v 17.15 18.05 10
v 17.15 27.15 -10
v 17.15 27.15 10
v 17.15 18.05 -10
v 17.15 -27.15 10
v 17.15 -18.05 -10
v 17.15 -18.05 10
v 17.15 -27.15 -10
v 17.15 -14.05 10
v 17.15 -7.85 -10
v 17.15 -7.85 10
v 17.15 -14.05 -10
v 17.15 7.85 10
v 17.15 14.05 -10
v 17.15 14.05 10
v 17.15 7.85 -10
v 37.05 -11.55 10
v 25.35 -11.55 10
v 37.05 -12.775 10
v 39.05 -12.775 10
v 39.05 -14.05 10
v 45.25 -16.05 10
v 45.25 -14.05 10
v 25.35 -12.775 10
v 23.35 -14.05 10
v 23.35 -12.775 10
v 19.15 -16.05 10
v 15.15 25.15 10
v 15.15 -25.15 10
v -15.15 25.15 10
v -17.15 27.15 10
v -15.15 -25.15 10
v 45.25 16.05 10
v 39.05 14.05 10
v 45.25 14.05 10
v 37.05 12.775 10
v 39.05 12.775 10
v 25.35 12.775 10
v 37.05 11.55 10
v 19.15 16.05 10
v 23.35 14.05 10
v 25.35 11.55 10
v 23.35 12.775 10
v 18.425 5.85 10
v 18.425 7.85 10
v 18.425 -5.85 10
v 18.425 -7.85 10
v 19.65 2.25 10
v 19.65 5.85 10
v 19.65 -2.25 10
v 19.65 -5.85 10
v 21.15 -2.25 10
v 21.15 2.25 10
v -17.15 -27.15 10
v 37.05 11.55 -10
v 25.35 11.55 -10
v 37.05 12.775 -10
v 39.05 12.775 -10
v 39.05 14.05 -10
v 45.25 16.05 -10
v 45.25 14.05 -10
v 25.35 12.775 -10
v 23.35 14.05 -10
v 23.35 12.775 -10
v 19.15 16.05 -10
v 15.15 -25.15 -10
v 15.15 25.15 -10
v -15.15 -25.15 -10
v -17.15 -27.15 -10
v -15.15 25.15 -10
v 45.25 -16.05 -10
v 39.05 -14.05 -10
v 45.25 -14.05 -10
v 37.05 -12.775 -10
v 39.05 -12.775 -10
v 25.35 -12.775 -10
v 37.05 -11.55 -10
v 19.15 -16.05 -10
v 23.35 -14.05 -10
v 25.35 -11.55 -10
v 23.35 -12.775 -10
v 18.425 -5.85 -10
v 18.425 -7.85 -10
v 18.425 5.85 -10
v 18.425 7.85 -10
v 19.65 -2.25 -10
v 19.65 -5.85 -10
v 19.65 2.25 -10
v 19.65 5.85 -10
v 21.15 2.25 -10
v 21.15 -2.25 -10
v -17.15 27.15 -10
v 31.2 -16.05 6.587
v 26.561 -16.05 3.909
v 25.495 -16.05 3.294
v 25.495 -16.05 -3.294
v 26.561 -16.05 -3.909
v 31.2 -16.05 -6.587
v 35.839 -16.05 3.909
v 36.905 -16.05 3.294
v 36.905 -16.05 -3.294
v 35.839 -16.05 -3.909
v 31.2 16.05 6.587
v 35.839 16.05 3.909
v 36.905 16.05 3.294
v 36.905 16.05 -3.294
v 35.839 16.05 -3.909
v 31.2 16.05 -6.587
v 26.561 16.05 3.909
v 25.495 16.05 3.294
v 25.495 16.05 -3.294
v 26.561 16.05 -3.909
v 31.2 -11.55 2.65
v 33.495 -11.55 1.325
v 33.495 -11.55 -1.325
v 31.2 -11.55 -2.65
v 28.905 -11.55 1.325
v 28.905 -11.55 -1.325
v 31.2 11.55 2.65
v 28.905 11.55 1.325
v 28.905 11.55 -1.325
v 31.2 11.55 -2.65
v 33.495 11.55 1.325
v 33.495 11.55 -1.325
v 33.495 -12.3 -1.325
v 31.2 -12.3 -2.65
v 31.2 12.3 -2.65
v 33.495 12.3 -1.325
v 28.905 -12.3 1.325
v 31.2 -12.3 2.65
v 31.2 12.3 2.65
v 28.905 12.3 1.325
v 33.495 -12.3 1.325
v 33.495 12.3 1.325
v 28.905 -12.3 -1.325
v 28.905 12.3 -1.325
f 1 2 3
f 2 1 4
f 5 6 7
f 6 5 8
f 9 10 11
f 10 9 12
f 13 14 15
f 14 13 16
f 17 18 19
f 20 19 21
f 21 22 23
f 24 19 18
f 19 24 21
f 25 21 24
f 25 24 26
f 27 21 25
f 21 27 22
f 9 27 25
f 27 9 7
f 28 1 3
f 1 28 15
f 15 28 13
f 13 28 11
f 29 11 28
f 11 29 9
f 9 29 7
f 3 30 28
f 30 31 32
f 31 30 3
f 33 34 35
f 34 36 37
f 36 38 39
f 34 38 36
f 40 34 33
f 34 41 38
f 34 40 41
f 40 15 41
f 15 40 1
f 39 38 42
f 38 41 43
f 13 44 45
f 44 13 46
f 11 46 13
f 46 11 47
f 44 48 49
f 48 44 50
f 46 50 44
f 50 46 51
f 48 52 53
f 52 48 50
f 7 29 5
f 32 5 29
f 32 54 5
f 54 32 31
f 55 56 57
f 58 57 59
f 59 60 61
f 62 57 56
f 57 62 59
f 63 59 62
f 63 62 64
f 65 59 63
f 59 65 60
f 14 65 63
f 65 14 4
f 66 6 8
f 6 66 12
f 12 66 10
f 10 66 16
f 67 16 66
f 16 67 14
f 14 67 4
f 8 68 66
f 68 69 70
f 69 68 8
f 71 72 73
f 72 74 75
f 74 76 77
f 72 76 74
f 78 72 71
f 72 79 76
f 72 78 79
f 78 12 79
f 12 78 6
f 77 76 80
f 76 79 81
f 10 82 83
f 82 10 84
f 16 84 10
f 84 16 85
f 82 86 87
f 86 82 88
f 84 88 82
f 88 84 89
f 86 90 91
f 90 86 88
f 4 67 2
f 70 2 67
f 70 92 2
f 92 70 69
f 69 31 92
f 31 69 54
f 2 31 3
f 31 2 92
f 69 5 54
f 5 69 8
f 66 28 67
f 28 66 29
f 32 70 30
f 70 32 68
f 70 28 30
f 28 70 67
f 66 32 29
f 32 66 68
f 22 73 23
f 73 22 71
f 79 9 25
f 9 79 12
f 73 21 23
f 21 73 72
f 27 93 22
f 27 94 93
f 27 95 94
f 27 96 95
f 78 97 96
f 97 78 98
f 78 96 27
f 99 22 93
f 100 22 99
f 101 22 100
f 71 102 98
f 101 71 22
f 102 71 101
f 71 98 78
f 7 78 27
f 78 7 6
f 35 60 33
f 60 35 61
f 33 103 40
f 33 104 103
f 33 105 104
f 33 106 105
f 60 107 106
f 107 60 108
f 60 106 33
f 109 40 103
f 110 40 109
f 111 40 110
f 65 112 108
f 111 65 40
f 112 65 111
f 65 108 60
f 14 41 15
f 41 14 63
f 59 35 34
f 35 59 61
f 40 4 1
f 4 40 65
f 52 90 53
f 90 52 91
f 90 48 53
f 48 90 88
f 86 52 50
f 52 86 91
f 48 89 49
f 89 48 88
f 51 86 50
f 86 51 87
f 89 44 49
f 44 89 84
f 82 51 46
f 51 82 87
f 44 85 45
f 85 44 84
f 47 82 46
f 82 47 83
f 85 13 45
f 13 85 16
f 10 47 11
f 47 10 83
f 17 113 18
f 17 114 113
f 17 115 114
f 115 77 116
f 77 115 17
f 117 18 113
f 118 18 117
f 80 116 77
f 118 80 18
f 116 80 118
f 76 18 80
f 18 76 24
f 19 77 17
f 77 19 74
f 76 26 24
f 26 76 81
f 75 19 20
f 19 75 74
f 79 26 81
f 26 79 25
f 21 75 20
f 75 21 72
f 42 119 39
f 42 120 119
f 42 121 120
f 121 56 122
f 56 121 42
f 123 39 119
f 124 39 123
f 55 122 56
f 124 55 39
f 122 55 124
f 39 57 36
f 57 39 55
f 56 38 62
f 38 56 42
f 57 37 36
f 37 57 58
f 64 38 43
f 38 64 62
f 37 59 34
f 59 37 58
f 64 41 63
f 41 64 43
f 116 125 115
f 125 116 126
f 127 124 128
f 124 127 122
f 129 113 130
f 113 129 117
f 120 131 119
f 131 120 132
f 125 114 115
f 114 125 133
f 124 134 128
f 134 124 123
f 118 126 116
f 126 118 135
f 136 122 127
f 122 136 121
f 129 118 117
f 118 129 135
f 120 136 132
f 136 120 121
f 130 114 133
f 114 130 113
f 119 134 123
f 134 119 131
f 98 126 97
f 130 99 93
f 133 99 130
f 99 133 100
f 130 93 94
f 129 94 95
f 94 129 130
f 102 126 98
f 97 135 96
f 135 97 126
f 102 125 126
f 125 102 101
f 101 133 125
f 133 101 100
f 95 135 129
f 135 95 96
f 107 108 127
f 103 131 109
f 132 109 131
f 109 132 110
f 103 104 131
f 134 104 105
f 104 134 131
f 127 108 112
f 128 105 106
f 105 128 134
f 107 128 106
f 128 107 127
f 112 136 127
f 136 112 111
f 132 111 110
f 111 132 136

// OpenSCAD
dim = [ 30, 50 ];
//dim = [ 38, 64 ];

c = 0.3;

w = dim[0]+c;
h = dim[1]+c;
l = 20;
t = 2;
b = 27.5+c*2;

difference()
{
	cube( [ w+t*2, h+t*2, l ], center = true );

	cube( [ w, h, l*2 ], center = true );
}

translate( [ w/2+t+b/2, 0, 0 ] )
difference()
{
	union()
	{
		for ( a = [ -1, +1 ] )
		{
			translate( [ 0, a*( b/2+t/2 ), 0 ] )
				cube( [ b, t, l ], center = true );
			translate( [ -b/2, a*( b/2+t ), 0 ] )
				cylinder( r = t, h = l, center = true, $fn = 4 );
		}

		for ( a = [ 0, 90, 270 ] ) rotate( [ 0, 0, a ] )
		{
			if ( a == 0 )
		translate( [ -b/2+1.5, 0, 0 ] )
			cube( [ 5, 4.5, l ], center = true );

		translate( [-b/2+0.75, 0, 0 ] )
			cube( [ 1+2.5, 12-c, l ], center = true );

		translate( [ -b/2+0.15, 0, 0 ] )
			cube( [ 1+1.25, 16-c, l ], center = true );
		}
	}

	//translate( [ w/2+t+3.5+2, 0, 0 ] )
	//	cube( [ 5.5, 10, 10 ], center = true );

	for ( a = [ 90, 270 ] ) rotate( [ 0, 0, a ] )
	{
		translate( [ -b/2-1, 0, 0 ] ) rotate( [ 0, 90, 0 ] )
			cylinder( r = 2.65, h = 40, center = true, $fn = 6 );

		translate( [ -b/2-1.75, 0, 0 ] ) rotate( [ 0, 90, 0 ] )
			cylinder( r2 = 2.65, r1 = 10, h = 7, center = true, $fn = 6 );
	}
}
